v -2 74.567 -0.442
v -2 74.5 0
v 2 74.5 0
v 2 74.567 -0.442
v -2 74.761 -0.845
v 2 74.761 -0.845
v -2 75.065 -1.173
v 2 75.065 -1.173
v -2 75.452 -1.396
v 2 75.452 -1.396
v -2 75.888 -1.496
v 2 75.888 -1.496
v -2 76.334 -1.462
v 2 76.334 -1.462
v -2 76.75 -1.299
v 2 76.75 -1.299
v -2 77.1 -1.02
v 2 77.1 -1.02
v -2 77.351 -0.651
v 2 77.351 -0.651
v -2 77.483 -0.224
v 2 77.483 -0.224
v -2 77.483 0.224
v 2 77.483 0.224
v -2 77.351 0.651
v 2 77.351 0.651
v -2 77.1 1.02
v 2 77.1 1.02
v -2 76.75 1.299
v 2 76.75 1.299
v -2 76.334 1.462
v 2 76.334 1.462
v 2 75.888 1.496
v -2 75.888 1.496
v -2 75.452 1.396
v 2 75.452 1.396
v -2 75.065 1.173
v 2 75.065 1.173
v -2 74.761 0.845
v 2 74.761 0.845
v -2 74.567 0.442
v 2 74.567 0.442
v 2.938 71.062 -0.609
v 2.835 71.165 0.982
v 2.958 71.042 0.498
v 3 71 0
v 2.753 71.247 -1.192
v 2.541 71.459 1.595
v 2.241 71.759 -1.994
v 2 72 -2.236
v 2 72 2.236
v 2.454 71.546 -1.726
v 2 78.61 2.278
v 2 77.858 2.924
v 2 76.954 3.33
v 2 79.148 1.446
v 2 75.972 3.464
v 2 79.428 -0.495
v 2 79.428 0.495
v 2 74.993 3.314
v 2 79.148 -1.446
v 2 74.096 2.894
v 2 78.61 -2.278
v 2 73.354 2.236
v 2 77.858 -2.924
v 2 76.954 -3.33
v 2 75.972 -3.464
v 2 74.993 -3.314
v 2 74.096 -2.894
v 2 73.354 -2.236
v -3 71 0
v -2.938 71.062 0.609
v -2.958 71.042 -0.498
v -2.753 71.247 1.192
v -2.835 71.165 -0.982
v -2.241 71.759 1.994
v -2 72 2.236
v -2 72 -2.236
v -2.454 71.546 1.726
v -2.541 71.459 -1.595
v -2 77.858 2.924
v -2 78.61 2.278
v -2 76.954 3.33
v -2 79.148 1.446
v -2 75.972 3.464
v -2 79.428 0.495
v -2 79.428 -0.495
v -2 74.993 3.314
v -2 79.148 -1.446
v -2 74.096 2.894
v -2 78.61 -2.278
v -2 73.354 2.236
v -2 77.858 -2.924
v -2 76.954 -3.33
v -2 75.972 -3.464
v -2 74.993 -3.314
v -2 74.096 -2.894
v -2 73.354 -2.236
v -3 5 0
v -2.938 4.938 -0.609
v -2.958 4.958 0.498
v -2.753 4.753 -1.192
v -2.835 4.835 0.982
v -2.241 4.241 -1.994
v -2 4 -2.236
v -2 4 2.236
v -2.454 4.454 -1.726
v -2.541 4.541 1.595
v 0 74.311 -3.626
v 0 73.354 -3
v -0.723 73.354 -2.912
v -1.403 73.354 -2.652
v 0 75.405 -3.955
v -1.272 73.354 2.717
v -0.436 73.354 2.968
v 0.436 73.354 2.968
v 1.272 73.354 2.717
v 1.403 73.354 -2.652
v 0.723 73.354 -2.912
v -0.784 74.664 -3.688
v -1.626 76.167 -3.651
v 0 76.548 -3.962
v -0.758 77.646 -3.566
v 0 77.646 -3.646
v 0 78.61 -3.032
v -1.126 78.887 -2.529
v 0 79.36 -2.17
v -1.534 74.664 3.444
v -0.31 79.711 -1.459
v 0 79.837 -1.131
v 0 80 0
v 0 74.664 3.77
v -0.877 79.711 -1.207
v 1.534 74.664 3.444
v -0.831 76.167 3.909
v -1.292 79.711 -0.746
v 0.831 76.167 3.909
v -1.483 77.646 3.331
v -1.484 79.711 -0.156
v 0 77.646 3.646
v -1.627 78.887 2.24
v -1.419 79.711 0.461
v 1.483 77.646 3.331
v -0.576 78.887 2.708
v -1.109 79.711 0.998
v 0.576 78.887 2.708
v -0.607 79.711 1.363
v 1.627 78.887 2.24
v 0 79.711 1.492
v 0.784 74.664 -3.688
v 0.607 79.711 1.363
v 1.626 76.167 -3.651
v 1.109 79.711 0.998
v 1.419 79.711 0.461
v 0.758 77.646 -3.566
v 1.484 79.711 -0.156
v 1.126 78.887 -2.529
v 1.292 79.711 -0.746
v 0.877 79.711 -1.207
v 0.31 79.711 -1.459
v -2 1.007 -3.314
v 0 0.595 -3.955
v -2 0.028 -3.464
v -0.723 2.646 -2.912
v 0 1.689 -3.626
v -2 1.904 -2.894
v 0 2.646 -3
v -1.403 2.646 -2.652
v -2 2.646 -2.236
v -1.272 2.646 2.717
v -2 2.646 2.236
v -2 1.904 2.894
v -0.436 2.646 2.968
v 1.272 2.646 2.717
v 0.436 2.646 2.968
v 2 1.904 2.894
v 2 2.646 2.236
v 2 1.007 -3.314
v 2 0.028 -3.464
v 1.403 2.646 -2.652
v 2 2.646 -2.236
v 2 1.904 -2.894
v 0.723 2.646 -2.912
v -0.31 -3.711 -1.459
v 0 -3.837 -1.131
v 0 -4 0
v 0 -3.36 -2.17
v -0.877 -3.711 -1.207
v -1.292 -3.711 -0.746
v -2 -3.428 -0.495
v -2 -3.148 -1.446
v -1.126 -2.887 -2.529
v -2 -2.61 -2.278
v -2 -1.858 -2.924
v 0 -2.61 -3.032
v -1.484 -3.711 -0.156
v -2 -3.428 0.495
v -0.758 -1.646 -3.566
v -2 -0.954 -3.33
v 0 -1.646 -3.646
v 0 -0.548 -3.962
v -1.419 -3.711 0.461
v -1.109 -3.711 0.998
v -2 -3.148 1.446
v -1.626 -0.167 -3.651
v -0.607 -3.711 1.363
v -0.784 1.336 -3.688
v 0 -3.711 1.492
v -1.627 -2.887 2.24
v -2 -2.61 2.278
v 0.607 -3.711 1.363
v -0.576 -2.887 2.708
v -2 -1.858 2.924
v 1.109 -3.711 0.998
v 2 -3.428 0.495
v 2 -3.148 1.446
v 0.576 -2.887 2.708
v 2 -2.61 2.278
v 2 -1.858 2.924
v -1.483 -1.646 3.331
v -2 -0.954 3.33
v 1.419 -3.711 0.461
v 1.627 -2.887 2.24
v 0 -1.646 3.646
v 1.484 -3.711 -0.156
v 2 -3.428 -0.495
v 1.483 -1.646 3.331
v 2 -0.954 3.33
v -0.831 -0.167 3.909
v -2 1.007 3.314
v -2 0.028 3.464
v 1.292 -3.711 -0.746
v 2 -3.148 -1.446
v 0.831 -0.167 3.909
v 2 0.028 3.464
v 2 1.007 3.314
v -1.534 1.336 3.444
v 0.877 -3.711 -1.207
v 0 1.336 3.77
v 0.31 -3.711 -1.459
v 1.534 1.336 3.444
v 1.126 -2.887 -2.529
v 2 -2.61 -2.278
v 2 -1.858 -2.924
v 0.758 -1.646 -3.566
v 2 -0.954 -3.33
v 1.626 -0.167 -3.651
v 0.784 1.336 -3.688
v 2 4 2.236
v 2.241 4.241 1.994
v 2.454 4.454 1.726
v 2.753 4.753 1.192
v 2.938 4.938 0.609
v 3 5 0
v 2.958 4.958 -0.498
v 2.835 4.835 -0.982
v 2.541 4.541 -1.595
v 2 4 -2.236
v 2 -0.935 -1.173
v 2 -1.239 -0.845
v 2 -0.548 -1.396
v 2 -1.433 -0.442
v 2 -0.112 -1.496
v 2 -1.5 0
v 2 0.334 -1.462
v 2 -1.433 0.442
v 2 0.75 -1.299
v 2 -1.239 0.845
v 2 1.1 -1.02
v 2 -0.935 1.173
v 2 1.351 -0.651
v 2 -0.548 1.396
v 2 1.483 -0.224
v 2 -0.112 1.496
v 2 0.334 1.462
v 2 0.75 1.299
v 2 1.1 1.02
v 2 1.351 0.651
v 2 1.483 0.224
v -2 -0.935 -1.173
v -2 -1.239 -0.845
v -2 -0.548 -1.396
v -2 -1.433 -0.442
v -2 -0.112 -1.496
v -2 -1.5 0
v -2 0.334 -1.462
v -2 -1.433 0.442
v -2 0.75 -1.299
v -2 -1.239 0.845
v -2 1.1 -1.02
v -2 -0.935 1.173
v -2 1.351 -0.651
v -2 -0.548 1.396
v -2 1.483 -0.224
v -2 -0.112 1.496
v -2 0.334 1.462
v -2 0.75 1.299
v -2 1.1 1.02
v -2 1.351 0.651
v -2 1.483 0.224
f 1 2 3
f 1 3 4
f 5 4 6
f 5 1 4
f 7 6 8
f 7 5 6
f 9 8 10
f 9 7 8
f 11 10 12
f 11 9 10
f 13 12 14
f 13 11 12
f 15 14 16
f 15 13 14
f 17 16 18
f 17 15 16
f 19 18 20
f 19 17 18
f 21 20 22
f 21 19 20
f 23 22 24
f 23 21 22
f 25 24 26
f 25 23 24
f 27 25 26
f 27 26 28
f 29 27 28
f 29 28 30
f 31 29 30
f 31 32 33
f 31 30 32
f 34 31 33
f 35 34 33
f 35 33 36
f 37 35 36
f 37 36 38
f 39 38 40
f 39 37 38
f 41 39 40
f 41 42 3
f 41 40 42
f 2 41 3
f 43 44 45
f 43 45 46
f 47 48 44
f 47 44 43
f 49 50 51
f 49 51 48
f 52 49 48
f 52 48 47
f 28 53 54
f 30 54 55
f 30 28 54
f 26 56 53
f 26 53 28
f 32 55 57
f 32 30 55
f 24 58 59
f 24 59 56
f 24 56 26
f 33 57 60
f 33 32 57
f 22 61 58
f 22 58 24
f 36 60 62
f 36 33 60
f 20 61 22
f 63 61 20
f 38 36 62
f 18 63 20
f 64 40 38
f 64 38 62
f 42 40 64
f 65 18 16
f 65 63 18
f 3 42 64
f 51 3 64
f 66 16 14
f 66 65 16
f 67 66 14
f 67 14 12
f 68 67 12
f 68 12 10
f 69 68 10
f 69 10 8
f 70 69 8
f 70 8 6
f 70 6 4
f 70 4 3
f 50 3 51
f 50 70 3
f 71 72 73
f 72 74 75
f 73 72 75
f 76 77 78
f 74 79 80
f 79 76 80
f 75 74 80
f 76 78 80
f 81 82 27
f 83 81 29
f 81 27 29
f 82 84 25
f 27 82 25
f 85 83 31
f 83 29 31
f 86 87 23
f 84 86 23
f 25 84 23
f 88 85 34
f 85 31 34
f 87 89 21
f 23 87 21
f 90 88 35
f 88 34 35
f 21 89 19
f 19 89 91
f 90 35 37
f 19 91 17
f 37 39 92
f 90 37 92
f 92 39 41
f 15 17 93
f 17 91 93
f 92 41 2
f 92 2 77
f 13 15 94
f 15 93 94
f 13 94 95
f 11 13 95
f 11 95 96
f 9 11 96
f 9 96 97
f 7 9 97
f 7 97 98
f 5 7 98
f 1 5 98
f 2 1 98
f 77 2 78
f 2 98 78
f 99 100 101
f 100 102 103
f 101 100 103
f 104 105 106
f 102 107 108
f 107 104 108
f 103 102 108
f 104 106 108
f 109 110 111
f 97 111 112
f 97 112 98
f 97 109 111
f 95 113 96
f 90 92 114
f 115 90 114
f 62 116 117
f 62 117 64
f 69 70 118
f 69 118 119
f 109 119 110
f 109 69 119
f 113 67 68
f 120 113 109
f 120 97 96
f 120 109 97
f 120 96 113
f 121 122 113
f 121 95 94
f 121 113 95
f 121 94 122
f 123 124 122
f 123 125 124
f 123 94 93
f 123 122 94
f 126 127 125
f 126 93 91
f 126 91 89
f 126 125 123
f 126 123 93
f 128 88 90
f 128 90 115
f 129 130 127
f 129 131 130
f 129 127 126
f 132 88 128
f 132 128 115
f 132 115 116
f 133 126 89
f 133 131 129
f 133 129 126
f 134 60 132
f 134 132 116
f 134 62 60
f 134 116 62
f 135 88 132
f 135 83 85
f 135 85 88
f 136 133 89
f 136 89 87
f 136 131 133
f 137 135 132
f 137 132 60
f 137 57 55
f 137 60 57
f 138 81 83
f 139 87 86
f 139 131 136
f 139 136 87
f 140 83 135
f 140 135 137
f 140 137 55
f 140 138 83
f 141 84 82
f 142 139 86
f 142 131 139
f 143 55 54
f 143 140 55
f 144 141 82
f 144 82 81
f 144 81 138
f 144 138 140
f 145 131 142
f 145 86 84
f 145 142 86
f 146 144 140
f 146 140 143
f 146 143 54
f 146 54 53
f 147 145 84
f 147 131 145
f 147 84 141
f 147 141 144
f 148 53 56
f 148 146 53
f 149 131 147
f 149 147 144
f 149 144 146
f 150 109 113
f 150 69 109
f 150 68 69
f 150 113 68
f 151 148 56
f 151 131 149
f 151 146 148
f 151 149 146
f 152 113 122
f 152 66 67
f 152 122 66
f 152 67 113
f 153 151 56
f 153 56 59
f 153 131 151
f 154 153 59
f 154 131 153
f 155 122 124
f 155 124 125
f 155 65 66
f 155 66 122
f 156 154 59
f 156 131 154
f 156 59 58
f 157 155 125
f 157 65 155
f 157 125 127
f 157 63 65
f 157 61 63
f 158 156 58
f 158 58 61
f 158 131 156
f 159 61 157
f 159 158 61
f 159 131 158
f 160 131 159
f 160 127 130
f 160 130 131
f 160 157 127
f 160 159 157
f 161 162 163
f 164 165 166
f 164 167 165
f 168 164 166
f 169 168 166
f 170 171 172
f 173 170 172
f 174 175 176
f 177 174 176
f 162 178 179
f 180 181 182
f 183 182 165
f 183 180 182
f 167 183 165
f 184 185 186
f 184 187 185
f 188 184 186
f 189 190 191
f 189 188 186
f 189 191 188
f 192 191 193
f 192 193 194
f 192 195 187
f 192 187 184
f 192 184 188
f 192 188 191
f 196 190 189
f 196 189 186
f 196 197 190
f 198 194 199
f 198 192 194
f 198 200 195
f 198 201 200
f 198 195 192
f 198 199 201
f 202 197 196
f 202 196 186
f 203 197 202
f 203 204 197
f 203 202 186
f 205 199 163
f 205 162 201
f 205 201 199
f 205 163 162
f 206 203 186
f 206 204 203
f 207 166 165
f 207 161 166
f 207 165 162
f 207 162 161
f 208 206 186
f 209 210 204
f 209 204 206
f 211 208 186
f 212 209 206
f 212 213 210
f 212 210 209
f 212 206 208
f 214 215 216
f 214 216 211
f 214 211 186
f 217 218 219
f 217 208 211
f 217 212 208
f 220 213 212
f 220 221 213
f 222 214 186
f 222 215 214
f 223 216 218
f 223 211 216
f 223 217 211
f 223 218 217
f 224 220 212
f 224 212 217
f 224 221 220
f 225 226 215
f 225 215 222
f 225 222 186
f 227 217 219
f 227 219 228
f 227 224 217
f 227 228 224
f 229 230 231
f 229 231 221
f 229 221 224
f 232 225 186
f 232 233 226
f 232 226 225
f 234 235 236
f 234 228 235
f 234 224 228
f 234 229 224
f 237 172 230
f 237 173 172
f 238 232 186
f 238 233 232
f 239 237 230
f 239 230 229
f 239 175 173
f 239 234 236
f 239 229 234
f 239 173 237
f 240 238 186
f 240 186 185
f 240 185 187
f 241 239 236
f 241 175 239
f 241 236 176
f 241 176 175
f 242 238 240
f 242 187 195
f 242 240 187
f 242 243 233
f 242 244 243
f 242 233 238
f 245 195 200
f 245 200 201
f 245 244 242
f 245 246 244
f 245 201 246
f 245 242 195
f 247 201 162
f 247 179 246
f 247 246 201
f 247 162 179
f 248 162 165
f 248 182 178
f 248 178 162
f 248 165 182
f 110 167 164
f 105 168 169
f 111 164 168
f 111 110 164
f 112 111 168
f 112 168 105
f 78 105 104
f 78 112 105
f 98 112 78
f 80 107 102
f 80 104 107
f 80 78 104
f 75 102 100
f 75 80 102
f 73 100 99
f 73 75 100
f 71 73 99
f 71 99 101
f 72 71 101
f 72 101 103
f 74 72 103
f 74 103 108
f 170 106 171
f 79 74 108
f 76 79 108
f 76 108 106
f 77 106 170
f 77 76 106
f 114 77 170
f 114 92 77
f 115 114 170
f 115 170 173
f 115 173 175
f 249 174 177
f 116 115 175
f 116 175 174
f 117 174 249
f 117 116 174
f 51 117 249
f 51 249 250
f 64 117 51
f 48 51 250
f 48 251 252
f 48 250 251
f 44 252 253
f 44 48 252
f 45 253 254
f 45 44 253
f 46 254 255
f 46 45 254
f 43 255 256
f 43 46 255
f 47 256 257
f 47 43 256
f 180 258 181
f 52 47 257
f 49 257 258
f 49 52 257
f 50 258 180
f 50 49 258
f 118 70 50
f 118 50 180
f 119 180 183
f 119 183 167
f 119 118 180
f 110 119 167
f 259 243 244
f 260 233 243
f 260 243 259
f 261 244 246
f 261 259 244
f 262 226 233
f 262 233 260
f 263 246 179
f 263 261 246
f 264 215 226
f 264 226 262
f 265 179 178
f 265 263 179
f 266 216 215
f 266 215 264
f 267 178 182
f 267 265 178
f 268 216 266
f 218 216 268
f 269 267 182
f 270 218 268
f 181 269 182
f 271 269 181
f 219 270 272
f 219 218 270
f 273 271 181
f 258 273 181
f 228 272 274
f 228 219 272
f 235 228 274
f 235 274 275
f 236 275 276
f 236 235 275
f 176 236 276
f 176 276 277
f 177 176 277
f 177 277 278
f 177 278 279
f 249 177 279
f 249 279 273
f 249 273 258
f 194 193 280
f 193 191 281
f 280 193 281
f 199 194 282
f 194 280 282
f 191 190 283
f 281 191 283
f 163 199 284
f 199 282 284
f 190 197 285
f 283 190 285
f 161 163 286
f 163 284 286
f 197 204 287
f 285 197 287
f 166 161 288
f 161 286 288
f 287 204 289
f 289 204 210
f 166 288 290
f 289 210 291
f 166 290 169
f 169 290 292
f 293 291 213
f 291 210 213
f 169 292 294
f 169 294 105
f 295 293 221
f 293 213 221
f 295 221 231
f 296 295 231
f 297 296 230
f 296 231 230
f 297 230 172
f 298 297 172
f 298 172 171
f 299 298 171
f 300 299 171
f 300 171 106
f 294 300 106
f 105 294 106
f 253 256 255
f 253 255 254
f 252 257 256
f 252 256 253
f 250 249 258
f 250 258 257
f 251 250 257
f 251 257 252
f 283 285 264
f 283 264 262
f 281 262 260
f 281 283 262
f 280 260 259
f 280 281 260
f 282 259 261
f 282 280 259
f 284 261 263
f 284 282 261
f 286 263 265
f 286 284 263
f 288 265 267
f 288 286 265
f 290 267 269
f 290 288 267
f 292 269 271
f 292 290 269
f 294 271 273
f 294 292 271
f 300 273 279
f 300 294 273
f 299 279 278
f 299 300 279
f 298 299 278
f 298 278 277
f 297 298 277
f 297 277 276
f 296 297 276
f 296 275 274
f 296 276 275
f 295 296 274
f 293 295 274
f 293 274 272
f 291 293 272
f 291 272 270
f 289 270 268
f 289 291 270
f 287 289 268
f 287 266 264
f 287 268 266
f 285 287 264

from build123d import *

# Parameters (mm, degrees)
CUT_EXTRUDE_1_DEPTH      = 81.199750623
CUT_EXTRUDE_2_DEPTH      = 81.255840909
CUT_EXTRUDE_2_DEPTH_BACK = 81.255840909
SKETCH_3_R               = 1.5
CUT_EXTRUDE_3_DEPTH      = 81.255840909
CUT_EXTRUDE_3_DEPTH_BACK = 81.255840909
SKETCH_4_R               = 1.5


with BuildPart() as part:
    # 草图1 → 旋转7 (revolve)
    with BuildSketch(Plane(origin=(0, 0, 0), x_dir=(0, 0, -1), z_dir=(1, 0, 0))):
        with BuildLine():
            Line((0, 80), (0, -4))
            ThreePointArc((0, -4), (3.645751311, -1.645751311), (3, 2.645751311))
            Line((3, 2.645751311), (3, 73.354248689))
            ThreePointArc((3, 73.354248689), (3.645751311, 77.645751311), (0, 80))
        make_face()
    revolve(axis=Axis((0, -21.628406948, 0), (0, 1, 0)))

    # 草图2 → 切除-拉伸1 (cut, symmetric)
    with BuildSketch(Plane.XY):
        Polygon((2, 85.145201401), (2, 72), (3, 71), (8.111541525, 71), (8.111541525, 85.145201401), align=None)
        Polygon((8.111541525, -9.145201401), (2, -9.145201401), (2, 4), (3, 5), (8.111541525, 5), align=None)
    cut_extrude_1 = extrude(amount=CUT_EXTRUDE_1_DEPTH, both=True, mode=Mode.SUBTRACT)

    # 镜向1: 切除-拉伸1 across plane
    add(cut_extrude_1.mirror(Plane(origin=(0, 0, 0), x_dir=(0, 0, 1), z_dir=(1, 0, 0))), mode=Mode.SUBTRACT)

    # 草图3 → 切除-拉伸2 (cut, two sides: drawn at the far end of the back side and taken through both)
    with BuildSketch(Plane(origin=(2, 0, 0), x_dir=(0, 0, -1), z_dir=(1, 0, 0)).offset(-CUT_EXTRUDE_2_DEPTH_BACK)):
        with Locations(Location((0, 76, 0), (0, 0, 270))):
            Circle(SKETCH_3_R)
    extrude(amount=CUT_EXTRUDE_2_DEPTH + CUT_EXTRUDE_2_DEPTH_BACK, mode=Mode.SUBTRACT)

    # 草图4 → 切除-拉伸3 (cut, two sides: drawn at the far end of the back side and taken through both)
    with BuildSketch(Plane(origin=(2, 0, 0), x_dir=(0, 0, -1), z_dir=(1, 0, 0)).offset(-CUT_EXTRUDE_3_DEPTH_BACK)):
        with Locations(Location((0, 0, 0), (0, 0, 270))):
            Circle(SKETCH_4_R)
    extrude(amount=CUT_EXTRUDE_3_DEPTH + CUT_EXTRUDE_3_DEPTH_BACK, mode=Mode.SUBTRACT)


solid = part.part
